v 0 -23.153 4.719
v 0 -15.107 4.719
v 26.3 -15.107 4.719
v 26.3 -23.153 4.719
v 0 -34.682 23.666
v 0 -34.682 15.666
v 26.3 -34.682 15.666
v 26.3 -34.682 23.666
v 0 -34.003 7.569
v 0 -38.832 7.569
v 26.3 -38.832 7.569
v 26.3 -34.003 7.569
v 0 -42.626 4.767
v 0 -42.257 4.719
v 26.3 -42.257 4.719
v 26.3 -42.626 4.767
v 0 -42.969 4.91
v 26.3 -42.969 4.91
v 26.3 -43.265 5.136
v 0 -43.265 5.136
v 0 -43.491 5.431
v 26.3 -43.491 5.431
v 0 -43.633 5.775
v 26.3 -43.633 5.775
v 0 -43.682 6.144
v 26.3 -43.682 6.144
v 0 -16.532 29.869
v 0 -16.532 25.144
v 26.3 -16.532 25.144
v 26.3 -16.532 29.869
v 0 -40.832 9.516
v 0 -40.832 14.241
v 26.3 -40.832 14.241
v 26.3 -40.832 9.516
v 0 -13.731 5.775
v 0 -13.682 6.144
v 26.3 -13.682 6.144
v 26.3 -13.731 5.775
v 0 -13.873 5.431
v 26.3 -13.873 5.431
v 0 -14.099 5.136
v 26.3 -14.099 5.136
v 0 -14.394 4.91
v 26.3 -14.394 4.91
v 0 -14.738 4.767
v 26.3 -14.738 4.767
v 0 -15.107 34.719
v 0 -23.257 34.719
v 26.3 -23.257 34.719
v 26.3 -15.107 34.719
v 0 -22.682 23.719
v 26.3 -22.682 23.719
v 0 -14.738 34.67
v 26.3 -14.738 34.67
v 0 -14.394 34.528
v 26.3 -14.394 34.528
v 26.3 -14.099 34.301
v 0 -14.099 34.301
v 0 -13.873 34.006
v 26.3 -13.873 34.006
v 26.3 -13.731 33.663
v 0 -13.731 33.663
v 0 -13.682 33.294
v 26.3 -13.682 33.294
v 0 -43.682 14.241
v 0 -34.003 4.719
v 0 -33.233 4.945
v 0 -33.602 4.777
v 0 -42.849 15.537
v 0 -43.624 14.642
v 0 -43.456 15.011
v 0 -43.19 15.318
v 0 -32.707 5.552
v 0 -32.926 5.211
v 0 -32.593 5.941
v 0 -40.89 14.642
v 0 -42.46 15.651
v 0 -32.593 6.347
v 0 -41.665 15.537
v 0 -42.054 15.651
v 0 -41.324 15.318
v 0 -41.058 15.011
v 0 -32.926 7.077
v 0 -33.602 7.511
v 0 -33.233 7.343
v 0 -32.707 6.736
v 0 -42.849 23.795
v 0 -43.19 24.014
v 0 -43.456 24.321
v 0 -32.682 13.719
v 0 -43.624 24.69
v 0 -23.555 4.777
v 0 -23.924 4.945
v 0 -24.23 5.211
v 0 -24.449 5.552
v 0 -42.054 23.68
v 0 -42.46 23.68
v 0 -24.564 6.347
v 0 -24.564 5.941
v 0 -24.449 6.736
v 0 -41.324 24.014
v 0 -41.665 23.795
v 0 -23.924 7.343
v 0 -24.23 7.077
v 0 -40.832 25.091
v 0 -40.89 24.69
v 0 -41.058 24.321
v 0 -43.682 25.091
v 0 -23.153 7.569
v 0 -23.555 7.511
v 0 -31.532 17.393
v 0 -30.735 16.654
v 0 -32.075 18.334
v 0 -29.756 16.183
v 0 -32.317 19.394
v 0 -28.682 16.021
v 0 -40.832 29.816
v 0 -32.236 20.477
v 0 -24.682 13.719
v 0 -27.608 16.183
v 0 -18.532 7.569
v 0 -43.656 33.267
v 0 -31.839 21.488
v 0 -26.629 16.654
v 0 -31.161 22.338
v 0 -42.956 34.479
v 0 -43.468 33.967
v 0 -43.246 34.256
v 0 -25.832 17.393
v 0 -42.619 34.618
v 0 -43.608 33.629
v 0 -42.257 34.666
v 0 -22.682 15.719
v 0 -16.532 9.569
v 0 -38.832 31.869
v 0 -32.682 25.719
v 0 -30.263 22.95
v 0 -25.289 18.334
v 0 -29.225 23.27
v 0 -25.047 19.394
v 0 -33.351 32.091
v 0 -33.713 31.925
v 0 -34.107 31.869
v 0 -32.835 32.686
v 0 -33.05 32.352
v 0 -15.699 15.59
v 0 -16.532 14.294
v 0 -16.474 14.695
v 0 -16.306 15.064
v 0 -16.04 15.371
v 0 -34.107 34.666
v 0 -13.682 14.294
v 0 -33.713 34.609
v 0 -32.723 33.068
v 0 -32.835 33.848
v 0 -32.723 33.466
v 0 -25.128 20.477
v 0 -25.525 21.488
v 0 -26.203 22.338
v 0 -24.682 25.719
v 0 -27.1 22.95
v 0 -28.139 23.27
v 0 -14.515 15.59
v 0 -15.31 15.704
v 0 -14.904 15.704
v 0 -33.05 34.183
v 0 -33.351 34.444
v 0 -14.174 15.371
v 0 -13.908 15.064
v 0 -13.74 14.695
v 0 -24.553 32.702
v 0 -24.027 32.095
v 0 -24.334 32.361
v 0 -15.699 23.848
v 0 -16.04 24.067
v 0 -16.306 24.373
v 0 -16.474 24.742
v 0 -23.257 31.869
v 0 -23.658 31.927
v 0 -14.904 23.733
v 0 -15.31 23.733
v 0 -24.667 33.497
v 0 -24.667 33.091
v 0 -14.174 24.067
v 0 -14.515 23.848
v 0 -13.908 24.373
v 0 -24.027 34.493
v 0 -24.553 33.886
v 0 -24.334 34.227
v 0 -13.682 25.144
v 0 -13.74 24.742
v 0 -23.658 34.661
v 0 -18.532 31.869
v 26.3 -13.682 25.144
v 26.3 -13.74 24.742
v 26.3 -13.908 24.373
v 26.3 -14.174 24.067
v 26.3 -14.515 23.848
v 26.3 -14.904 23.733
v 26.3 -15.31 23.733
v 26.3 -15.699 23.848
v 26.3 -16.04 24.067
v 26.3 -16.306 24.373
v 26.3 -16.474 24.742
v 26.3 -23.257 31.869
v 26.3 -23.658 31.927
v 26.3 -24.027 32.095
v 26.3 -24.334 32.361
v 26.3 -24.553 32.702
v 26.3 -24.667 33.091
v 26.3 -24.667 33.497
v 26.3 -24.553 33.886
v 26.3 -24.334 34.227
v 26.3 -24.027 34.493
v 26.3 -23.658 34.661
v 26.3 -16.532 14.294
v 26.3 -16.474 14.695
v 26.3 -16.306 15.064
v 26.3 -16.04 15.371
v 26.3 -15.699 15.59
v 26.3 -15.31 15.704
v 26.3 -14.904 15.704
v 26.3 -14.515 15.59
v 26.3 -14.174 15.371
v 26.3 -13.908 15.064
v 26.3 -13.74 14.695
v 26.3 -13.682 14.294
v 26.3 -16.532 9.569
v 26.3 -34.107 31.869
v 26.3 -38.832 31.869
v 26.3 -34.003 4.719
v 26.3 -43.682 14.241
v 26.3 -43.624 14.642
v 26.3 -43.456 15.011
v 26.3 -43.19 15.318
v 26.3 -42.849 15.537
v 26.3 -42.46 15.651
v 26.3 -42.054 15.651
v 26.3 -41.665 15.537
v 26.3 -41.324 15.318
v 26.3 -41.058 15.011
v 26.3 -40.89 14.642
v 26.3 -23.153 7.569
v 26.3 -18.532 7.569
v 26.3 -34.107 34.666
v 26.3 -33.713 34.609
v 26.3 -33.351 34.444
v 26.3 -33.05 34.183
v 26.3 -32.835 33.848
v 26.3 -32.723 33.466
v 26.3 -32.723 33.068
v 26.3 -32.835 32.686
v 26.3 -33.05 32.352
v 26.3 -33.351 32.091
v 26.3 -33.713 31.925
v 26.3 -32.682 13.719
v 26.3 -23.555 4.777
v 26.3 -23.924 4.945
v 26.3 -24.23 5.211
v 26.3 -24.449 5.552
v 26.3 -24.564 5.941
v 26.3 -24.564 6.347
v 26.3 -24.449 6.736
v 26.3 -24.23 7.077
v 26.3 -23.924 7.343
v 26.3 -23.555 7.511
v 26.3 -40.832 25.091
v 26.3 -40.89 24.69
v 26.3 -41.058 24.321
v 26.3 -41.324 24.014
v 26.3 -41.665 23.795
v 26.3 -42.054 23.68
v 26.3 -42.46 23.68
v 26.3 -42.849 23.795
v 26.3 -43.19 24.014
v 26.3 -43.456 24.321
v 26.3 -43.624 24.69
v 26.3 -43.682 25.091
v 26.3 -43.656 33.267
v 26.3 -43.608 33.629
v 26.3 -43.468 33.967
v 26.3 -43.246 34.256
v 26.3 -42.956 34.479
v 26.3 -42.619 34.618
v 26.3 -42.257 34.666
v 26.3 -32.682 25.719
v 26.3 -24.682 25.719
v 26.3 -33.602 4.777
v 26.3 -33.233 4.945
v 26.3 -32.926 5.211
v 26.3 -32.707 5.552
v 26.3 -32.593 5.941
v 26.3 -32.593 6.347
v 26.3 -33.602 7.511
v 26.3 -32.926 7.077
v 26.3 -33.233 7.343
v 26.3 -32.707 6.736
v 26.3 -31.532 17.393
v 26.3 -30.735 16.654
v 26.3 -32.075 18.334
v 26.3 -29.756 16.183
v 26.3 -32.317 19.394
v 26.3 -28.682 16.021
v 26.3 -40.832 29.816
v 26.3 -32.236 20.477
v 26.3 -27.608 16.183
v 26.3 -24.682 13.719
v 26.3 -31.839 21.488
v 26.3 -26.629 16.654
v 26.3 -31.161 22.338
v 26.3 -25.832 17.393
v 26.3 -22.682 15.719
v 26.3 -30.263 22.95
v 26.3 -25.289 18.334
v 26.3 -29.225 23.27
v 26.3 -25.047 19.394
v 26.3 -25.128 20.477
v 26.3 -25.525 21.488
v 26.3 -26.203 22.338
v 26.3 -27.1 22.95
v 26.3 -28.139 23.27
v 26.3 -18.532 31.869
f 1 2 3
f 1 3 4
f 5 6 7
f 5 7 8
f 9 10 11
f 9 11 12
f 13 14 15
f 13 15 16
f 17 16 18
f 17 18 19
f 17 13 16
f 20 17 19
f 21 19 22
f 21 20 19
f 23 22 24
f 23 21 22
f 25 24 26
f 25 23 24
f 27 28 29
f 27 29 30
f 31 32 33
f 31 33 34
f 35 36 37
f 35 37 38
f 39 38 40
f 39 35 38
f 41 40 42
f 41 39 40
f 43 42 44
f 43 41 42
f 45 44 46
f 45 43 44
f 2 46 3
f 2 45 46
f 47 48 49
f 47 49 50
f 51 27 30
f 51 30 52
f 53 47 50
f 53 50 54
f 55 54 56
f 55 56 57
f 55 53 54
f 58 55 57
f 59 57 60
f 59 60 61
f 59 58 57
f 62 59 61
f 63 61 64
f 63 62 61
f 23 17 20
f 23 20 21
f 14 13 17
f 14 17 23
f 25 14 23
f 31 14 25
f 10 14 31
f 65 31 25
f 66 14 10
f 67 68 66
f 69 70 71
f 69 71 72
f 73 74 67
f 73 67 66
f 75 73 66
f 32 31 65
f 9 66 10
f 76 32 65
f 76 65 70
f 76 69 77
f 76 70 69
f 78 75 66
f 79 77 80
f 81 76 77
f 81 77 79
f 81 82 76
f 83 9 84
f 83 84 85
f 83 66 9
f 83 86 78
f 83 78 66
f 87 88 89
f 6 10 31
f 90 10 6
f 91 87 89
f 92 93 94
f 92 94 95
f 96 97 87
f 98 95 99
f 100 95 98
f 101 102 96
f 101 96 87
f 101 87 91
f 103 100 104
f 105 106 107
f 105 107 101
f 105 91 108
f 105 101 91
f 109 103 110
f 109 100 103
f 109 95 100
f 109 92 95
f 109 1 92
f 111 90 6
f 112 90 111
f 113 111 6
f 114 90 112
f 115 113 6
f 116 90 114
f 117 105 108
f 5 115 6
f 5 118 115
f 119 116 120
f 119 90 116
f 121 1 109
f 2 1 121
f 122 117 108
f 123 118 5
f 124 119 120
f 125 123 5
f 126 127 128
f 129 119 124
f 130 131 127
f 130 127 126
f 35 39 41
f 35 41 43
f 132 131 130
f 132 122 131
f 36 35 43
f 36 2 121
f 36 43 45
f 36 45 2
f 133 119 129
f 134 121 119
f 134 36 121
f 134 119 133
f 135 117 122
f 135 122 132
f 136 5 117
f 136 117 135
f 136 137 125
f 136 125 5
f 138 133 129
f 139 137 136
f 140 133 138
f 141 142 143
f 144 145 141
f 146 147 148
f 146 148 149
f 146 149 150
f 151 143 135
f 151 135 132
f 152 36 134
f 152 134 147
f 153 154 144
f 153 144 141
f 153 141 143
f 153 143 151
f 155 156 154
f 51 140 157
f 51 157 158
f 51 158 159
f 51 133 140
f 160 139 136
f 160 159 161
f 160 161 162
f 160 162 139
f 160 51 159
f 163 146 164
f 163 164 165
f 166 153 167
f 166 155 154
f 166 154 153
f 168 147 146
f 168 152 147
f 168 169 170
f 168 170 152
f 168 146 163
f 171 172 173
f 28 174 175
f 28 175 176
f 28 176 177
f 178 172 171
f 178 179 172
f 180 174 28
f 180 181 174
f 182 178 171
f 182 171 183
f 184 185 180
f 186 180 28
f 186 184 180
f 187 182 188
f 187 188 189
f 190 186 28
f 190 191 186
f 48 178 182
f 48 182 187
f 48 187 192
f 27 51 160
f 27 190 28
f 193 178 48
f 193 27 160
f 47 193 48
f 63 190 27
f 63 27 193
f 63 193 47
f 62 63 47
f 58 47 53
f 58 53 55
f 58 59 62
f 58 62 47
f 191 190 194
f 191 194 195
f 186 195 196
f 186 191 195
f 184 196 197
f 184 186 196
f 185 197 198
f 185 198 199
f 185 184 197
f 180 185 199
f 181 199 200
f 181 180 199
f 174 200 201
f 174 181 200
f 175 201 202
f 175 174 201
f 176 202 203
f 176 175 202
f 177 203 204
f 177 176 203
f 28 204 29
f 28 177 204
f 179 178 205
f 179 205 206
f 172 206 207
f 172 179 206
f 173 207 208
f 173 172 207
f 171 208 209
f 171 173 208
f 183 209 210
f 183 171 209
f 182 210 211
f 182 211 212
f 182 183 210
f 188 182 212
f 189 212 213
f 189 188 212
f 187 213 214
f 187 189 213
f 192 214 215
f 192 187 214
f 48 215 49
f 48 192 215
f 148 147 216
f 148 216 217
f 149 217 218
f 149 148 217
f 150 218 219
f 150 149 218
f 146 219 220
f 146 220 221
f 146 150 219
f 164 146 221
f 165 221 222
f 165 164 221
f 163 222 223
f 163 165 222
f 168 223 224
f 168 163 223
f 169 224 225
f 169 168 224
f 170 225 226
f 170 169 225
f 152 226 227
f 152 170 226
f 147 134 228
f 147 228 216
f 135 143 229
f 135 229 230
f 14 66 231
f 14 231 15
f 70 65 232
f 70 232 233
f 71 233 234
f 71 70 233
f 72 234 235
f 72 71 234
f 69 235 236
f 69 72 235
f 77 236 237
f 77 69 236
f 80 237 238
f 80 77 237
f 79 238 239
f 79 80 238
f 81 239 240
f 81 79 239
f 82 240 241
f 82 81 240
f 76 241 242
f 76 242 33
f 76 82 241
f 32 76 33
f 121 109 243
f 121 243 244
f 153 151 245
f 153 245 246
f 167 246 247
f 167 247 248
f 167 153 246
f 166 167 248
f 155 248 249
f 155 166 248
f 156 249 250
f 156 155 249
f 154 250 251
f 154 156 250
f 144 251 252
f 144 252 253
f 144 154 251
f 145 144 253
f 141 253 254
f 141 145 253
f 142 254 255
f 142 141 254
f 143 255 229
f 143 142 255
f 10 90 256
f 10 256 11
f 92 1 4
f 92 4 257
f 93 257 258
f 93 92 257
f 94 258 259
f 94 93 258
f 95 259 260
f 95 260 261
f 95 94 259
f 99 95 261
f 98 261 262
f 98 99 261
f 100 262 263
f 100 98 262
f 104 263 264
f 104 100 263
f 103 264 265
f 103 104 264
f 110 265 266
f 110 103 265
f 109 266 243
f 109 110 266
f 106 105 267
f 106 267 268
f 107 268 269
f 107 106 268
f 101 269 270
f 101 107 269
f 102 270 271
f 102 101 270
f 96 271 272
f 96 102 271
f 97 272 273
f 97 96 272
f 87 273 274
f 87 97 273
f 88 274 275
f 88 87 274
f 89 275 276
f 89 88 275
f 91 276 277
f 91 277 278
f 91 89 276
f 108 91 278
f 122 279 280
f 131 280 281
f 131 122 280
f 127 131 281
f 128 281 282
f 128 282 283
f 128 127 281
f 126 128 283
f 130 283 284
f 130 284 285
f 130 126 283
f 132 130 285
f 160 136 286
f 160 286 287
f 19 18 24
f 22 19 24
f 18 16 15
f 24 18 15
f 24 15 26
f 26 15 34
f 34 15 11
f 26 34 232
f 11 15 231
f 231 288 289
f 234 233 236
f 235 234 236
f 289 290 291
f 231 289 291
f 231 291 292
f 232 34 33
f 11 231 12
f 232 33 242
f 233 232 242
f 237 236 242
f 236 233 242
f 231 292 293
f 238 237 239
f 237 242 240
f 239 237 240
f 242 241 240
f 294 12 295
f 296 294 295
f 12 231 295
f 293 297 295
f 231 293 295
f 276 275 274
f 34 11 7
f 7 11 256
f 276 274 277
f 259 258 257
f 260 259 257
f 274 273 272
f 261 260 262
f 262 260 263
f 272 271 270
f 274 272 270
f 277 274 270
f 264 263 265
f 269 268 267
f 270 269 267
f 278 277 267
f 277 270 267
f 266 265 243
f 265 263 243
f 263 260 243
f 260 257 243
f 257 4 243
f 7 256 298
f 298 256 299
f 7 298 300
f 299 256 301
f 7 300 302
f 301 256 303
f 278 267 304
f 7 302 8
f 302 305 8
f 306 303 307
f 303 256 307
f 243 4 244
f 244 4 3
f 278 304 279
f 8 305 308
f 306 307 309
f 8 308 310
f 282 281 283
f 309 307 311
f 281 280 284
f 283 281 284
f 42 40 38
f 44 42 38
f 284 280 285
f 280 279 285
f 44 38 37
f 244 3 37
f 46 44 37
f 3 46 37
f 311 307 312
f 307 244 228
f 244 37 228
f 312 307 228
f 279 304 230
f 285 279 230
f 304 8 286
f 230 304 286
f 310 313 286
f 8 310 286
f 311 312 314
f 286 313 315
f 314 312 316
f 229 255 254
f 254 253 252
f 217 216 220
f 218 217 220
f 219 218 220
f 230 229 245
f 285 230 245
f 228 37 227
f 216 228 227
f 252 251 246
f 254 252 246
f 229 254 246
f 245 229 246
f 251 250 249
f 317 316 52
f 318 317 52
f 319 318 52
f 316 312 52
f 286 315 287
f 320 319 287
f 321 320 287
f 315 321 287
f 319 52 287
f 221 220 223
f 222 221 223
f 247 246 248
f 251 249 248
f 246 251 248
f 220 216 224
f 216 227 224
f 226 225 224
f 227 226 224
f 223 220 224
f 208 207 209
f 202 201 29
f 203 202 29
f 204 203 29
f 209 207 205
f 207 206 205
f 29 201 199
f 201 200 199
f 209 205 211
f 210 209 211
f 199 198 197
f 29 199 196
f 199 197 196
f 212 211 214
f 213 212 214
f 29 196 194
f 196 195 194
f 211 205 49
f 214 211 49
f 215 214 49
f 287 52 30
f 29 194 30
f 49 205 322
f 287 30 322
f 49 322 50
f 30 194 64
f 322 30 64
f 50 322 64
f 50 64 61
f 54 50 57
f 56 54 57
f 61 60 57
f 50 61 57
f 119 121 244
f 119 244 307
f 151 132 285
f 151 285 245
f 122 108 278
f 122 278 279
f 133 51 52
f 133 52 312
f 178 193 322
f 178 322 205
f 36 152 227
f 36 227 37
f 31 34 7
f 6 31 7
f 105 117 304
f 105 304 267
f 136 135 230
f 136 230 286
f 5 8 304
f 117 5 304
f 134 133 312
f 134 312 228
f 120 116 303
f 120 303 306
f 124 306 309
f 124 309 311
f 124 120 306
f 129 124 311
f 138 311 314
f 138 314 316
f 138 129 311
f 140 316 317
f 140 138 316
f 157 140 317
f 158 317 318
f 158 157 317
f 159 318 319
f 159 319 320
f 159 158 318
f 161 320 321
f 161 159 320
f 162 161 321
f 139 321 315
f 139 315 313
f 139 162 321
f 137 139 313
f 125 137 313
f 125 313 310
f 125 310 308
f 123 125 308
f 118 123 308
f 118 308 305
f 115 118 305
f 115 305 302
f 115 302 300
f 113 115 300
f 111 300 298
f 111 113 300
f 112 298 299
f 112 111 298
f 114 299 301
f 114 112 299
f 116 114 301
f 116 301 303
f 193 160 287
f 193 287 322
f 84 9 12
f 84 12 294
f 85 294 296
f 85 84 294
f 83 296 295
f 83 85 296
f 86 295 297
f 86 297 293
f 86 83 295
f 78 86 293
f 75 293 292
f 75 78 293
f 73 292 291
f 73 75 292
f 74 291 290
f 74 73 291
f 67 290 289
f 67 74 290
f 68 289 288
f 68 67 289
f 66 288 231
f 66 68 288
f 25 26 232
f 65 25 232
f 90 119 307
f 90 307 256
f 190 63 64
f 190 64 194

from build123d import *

# Parameters (mm, degrees)
CROQUIS1_R              = 3.645
SALIENTE_EXTRUIR1_DEPTH = 26.3


with BuildPart() as part:
    # Croquis1 → Saliente-Extruir1 (new body)
    with BuildSketch(Plane(origin=(0, 0, 0), x_dir=(0, 0, -1), z_dir=(1, 0, 0))):
        with BuildLine():
            Line((-14.240976213, -40.83193708), (-9.515976213, -40.83193708))
            Line((-9.515976213, -40.83193708), (-15.665976213, -34.68193708))
            Line((-15.665976213, -34.68193708), (-23.665976213, -34.68193708))
            Line((-23.665976213, -34.68193708), (-29.815976213, -40.83193708))
            Line((-29.815976213, -40.83193708), (-25.090976213, -40.83193708))
            ThreePointArc((-25.090976213, -40.83193708), (-23.665976213, -42.25693708), (-25.090976213, -43.68193708))
            Line((-25.090976213, -43.68193708), (-33.267411985, -43.655501308))
            ThreePointArc((-33.267411985, -43.655501308), (-34.256346235, -43.245871329), (-34.665976213, -42.25693708))
            Line((-34.665976213, -42.25693708), (-34.665976213, -34.10693708))
            ThreePointArc((-34.665976213, -34.10693708), (-33.267411985, -32.708372853), (-31.868847758, -34.10693708))
            Line((-31.868847758, -34.10693708), (-31.868847758, -38.83193708))
            Line((-31.868847758, -38.83193708), (-25.718847758, -32.68193708))
            Line((-25.718847758, -32.68193708), (-25.718847758, -24.68193708))
            Line((-25.718847758, -24.68193708), (-31.868847758, -18.53193708))
            Line((-31.868847758, -18.53193708), (-31.868847758, -23.25693708))
            ThreePointArc((-31.868847758, -23.25693708), (-33.293847758, -24.68193708), (-34.718847758, -23.25693708))
            Line((-34.718847758, -23.25693708), (-34.718847758, -15.10698367))
            ThreePointArc((-34.718847758, -15.10698367), (-34.301474921, -14.099356507), (-33.293847758, -13.68198367))
            Line((-33.293847758, -13.68198367), (-25.143847758, -13.68198367))
            ThreePointArc((-25.143847758, -13.68198367), (-23.718847758, -15.10698367), (-25.143847758, -16.53198367))
            Line((-25.143847758, -16.53198367), (-29.868847758, -16.53198367))
            Line((-29.868847758, -16.53198367), (-23.718847758, -22.68198367))
            Line((-23.718847758, -22.68198367), (-15.718847758, -22.68198367))
            Line((-15.718847758, -22.68198367), (-9.568847758, -16.53198367))
            Line((-9.568847758, -16.53198367), (-14.293847758, -16.53198367))
            ThreePointArc((-14.293847758, -16.53198367), (-15.718847758, -15.10698367), (-14.293847758, -13.68198367))
            Line((-14.293847758, -13.68198367), (-6.143847758, -13.68198367))
            ThreePointArc((-6.143847758, -13.68198367), (-5.136220595, -14.099356507), (-4.718847758, -15.10698367))
            Line((-4.718847758, -15.10698367), (-4.718847758, -23.153239985))
            ThreePointArc((-4.718847758, -23.153239985), (-6.143847758, -24.578239985), (-7.568847758, -23.153239985))
            Line((-7.568847758, -23.153239985), (-7.568847758, -18.53198367))
            Line((-7.568847758, -18.53198367), (-13.718847758, -24.68198367))
            Line((-13.718847758, -24.68198367), (-13.718847758, -32.68198367))
            Line((-13.718847758, -32.68198367), (-7.568847758, -38.83198367))
            Line((-7.568847758, -38.83198367), (-7.568847758, -34.003239985))
            ThreePointArc((-7.568847758, -34.003239985), (-6.143847758, -32.578239985), (-4.718847758, -34.003239985))
            Line((-4.718847758, -34.003239985), (-4.718847758, -42.25693708))
            ThreePointArc((-4.718847758, -42.25693708), (-5.136220595, -43.264564244), (-6.143847758, -43.68193708))
            Line((-6.143847758, -43.68193708), (-14.240976213, -43.68193708))
            ThreePointArc((-14.240976213, -43.68193708), (-15.665976213, -42.25693708), (-14.240976213, -40.83193708))
        make_face()
        with Locations((-19.665976213, -28.68193708)):
            Circle(CROQUIS1_R, mode=Mode.SUBTRACT)
    extrude(amount=SALIENTE_EXTRUIR1_DEPTH)


solid = part.part
